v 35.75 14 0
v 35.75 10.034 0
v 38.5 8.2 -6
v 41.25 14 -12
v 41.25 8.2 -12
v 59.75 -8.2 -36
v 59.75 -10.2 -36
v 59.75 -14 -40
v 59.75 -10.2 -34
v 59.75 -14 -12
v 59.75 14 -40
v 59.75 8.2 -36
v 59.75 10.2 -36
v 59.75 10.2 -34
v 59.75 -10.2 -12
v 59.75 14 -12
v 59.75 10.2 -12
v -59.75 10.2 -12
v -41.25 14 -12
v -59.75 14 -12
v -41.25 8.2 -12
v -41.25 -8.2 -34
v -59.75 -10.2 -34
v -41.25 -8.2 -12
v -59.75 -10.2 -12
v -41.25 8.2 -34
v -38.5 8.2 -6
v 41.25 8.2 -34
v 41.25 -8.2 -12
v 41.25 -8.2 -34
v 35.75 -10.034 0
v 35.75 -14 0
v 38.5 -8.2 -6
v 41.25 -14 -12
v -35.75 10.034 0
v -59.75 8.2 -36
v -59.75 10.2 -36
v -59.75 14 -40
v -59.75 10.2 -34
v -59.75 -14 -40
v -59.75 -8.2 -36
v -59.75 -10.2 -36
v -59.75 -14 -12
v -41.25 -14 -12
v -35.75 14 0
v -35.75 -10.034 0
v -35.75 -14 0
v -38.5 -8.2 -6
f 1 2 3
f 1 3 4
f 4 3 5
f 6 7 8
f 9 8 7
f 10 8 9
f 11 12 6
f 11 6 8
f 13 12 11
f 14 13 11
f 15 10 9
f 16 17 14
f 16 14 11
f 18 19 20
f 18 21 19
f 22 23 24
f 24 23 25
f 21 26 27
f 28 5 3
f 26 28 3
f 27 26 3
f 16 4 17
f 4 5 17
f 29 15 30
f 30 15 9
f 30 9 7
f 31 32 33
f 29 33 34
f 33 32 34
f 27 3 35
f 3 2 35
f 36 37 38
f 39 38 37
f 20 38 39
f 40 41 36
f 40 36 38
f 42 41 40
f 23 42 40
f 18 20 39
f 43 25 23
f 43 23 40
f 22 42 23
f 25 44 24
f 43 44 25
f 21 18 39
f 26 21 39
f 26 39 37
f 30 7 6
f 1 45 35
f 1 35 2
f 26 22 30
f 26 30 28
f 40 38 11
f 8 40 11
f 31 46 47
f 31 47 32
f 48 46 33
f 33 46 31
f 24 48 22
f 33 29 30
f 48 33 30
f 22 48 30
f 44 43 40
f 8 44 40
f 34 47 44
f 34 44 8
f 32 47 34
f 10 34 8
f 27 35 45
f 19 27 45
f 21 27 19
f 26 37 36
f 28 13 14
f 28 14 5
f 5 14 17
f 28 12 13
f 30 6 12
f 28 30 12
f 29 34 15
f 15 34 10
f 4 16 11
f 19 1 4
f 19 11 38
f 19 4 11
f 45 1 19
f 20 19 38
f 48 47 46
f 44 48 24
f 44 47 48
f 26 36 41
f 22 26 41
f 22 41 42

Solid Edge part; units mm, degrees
sketch "Sketch1" plane through (0, 0, 0) normal (0, 0, 1) x (1, 0, 0)
  line L0 (-59.75, -14) -> (59.75, -14)
  line L1 (59.75, -14) -> (59.75, 14)
  line L2 (59.75, 14) -> (-59.75, 14)
  line L3 (-59.75, 14) -> (-59.75, -14)
extrude "Protrusion1" add sketch "Sketch1" against normal blind 40
sketch "Sketch2" plane through (0, -14, -20) normal (0, -1, 0) x (1, 0, 0)
  line L0 (-59.75, 20) -> (-41.25, 20)
  line L1 (-41.25, 20) -> (-41.25, 8)
  line L2 (-41.25, 8) -> (-59.75, 8)
  line L3 (-59.75, 8) -> (-59.75, 20)
extrude "ExtrudedCutout_1" cut sketch "Sketch2" against normal blind 28
sketch "Sketch3" plane through (0, -14, -20) normal (0, -1, 0) x (1, 0, 0)
  line L0 (59.75, 20) -> (41.25, 20)
  line L1 (41.25, 20) -> (41.25, 8)
  line L2 (41.25, 8) -> (59.75, 8)
  line L3 (59.75, 8) -> (59.75, 20)
extrude "ExtrudedCutout_2" cut sketch "Sketch3" against normal blind 28
sketch "Sketch4" plane through (0, -14, -20) normal (0, -1, 0) x (1, 0, 0)
  line L0 (41.25, 20) -> (35.75, 20)
  line L1 (35.75, 20) -> (41.25, 8)
  line L2 (41.25, 8) -> (41.25, 20)
extrude "ExtrudedCutout_3" cut sketch "Sketch4" against normal blind 28
sketch "Sketch5" plane through (0, -14, -20) normal (0, -1, 0) x (1, 0, 0)
  line L0 (-41.25, 20) -> (-35.75, 20)
  line L1 (-35.75, 20) -> (-41.25, 8)
  line L2 (-41.25, 8) -> (-41.25, 20)
extrude "ExtrudedCutout_4" cut sketch "Sketch5" against normal blind 28
sketch "Sketch6" plane through (59.75, 0, -26) normal (1, 0, 0) x (0, 1, 0)
  line L0 (-8.2, 26) -> (-8.2, -8)
  line L1 (-8.2, -8) -> (8.2, -8)
  line L2 (8.2, -8) -> (8.2, 26)
  line L3 (8.2, 26) -> (-8.2, 26)
extrude "ExtrudedCutout_5" cut sketch "Sketch6" against normal blind 119.5
chamfer "Chamfer_1" distance 6 angle 17 1 edges at (0, 8.2, 0) measured on face at (-38.6383, 8.2, -28.6733)
chamfer "Chamfer_2" distance 6 angle 17 1 edges at (0, -8.2, 0) measured on face at (1.195, -8.2, -5.3267)
chamfer "Chamfer_5" distance 18.5 distance2 2 1 edges at (59.75, 8.2, -23) measured on face at (-38.6383, 8.2, -29.6133)
chamfer "Chamfer_6" distance 18.5 distance2 2 1 edges at (59.75, -8.2, -23) measured on face at (-38.6383, -8.2, -10.3867)
chamfer "Chamfer_7" distance 18.5 distance2 2 1 edges at (-59.75, 8.2, -23) measured on face at (-41.9067, 8.2, -29.6133)
chamfer "Chamfer_8" distance 18.5 distance2 2 1 edges at (-59.75, 1, -34) measured on face at (-38.6383, -7.004, -34)
chamfer "Chamfer_9" distance 18.5 distance2 2 1 edges at (-59.75, -8.2, -24) measured on face at (-8.24, -8.2, -10.7)
chamfer "Chamfer_10" distance 18.5 distance2 2 1 edges at (59.75, 0, -34) measured on face at (-23.4067, -7.004, -34)
